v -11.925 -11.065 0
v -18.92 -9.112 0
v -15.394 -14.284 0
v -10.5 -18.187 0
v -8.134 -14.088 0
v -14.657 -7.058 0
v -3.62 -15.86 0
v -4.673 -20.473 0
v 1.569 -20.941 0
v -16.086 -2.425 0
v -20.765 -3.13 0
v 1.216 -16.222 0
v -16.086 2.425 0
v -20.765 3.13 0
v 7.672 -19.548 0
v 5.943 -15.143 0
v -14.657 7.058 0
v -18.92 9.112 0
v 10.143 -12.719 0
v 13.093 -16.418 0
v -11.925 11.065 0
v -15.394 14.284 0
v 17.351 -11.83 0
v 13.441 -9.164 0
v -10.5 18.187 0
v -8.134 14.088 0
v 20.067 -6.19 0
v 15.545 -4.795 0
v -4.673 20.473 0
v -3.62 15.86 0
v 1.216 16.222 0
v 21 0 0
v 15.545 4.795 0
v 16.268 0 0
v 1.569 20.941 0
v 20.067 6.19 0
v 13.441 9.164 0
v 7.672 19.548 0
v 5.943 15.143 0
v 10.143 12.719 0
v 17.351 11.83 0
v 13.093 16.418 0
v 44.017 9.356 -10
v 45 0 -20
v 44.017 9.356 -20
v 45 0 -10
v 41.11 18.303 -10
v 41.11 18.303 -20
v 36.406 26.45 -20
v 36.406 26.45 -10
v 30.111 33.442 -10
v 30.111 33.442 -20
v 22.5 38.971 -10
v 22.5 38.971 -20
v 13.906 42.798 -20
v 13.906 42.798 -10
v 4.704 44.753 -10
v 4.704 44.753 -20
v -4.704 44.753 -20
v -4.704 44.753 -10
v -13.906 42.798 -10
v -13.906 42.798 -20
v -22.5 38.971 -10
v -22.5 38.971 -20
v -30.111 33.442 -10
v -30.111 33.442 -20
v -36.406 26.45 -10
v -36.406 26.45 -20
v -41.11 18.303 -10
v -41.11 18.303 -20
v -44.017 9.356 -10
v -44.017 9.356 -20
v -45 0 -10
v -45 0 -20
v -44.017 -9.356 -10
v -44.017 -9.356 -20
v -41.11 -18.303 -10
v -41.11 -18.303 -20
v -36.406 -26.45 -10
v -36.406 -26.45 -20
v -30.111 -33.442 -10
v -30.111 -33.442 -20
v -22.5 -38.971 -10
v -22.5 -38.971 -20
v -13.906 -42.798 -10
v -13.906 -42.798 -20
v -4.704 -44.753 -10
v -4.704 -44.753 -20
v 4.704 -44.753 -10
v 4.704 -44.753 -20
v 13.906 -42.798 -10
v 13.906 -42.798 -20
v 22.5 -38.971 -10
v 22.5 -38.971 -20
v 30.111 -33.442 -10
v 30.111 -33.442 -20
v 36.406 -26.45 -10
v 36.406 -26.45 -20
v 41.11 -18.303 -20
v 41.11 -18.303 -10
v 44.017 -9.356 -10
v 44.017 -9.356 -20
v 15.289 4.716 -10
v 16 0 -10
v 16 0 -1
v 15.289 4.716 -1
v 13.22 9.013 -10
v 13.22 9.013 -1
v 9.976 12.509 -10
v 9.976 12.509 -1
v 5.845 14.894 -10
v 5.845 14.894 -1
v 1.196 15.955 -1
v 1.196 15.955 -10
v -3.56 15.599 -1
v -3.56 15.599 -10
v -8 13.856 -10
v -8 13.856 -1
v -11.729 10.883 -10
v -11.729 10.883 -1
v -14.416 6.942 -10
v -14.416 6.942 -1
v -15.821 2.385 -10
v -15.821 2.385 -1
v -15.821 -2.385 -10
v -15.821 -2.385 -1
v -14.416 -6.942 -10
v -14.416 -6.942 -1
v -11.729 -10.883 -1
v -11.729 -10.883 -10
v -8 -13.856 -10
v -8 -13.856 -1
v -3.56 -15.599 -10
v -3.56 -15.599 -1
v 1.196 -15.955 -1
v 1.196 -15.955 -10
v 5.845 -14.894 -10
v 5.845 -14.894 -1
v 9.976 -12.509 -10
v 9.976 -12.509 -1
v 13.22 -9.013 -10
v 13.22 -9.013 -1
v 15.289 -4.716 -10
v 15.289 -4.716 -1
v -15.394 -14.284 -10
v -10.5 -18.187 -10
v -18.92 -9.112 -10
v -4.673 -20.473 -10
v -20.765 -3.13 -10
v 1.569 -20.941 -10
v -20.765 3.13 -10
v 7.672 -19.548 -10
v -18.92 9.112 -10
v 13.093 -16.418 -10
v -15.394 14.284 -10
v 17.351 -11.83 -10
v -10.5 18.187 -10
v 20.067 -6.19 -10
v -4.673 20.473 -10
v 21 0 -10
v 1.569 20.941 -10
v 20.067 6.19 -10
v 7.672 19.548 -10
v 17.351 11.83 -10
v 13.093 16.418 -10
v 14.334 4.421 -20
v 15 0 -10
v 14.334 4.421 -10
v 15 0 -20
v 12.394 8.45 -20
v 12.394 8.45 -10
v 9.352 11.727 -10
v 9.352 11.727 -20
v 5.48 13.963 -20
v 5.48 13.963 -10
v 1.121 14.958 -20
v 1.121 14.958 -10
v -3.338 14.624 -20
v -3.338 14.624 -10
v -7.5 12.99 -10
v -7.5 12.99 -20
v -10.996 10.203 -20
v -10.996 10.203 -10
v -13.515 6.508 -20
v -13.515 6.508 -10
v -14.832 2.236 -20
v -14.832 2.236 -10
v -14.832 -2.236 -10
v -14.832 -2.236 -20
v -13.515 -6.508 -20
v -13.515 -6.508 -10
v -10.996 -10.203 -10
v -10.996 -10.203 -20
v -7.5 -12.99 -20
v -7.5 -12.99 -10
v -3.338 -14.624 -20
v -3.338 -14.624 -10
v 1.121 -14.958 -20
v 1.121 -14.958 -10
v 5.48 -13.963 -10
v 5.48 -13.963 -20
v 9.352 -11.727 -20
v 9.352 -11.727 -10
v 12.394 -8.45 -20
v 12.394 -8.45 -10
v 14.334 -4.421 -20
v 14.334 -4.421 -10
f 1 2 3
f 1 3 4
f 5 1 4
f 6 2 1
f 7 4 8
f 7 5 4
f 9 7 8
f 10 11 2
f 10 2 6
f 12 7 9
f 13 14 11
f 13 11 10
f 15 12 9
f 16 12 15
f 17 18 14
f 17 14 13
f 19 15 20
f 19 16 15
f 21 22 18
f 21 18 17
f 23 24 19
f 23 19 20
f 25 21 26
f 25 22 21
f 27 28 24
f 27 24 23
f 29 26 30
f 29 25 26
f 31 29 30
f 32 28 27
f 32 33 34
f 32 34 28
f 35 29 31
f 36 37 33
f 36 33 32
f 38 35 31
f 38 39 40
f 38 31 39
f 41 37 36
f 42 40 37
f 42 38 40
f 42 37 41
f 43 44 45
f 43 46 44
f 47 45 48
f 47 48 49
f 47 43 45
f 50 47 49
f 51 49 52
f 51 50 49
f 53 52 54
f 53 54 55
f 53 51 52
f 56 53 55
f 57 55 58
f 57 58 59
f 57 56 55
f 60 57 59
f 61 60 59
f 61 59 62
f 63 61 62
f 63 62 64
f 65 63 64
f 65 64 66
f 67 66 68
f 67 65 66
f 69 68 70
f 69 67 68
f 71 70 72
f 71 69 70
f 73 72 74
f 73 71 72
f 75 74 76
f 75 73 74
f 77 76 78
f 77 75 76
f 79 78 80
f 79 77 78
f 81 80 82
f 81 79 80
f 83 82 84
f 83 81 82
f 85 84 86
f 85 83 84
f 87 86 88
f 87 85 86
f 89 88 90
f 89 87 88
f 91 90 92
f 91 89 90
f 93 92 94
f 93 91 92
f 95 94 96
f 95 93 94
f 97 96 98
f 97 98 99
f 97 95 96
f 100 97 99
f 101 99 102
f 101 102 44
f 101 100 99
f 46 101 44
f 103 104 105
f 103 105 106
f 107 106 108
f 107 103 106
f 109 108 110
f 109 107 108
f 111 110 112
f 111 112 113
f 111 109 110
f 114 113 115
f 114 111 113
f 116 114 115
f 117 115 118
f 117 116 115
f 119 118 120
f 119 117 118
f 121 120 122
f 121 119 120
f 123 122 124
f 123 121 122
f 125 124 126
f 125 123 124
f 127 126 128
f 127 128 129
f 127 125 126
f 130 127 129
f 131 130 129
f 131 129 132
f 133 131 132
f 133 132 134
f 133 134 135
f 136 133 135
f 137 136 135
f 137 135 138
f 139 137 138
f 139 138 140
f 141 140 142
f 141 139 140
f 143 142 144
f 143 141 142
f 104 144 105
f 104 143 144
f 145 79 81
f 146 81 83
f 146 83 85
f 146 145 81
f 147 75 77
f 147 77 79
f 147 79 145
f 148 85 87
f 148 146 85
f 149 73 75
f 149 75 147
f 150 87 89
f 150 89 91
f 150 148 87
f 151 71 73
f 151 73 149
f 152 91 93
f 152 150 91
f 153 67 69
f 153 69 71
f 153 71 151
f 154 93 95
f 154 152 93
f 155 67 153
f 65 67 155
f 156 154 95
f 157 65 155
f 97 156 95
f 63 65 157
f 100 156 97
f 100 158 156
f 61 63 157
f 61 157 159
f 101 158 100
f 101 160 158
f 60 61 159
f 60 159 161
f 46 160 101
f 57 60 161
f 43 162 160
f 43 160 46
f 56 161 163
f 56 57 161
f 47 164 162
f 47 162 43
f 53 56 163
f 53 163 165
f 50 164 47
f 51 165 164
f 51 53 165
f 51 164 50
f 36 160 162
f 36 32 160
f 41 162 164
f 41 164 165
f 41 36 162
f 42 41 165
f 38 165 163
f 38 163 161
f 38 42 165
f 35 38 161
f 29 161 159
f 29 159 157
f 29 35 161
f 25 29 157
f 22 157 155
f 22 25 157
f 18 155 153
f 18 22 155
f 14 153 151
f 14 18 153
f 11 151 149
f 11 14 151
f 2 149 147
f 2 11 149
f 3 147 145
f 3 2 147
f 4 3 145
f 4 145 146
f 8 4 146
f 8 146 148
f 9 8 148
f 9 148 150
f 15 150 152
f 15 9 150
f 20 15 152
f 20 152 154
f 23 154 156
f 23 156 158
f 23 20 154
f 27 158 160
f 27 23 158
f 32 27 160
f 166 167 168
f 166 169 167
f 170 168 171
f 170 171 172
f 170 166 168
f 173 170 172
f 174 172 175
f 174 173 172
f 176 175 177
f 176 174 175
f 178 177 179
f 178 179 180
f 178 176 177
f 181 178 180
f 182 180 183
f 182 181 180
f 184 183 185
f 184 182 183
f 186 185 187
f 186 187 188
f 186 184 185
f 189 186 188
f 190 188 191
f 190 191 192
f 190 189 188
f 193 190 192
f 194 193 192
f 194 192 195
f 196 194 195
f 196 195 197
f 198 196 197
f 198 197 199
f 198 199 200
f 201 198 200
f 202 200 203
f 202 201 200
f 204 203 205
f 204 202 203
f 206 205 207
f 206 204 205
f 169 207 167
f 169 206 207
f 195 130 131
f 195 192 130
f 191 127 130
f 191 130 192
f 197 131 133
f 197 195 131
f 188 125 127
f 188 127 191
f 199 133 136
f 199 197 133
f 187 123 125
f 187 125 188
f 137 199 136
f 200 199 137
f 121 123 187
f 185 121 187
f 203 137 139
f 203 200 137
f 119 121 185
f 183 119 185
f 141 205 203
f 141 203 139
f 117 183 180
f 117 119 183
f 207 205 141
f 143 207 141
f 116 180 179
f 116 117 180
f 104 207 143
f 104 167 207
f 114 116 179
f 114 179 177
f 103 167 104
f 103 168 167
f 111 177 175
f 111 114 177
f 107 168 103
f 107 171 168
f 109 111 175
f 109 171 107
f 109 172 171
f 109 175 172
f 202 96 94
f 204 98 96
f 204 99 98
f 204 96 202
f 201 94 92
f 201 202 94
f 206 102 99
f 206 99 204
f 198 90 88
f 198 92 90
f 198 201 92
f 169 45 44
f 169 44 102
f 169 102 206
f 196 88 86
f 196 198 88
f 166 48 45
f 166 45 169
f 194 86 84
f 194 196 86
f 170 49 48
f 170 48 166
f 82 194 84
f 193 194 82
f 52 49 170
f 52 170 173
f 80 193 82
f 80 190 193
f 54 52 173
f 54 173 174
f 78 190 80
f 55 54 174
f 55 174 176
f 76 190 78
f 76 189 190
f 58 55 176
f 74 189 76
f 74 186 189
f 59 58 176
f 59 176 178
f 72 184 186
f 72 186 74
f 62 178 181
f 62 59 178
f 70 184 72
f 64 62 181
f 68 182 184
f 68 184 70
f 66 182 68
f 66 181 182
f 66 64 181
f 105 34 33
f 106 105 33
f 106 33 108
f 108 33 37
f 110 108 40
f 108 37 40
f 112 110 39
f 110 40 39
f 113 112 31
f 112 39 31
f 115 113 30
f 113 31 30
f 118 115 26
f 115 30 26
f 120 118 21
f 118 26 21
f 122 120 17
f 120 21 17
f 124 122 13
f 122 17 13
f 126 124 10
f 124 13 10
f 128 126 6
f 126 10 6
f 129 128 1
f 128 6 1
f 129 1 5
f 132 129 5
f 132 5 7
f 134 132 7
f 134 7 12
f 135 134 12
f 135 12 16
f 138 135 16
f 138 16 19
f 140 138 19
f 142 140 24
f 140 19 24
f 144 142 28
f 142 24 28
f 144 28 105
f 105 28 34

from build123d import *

# Parameters (mm, degrees)
CHAMFER1_SIZE  = 1
CHAMFER1_SIZE2 = 0.267949192


with BuildPart() as part:
    # Sketch1 → Revolve1 (revolve)
    with BuildSketch(Plane(origin=(0, 0, 0), x_dir=(1, 0, 0), z_dir=(0, 1, 0))):
        Polygon((16, 0), (16, 10), (15, 10), (15, 20), (45, 20), (45, 10), (21, 10), (21, 0), align=None)
    revolve(axis=Axis((0, 0, 0), (0, 0, 1)))

    # Chamfer1
    chamfer1_edges = [part.edges().sort_by_distance(p)[0] for p in [
        (-16, 0, 0),
    ]]
    chamfer1_side = [part.faces().sort_by_distance(p)[0] for p in [
        (-16, 0, -5),
    ]]
    chamfer(chamfer1_edges, length=CHAMFER1_SIZE, length2=CHAMFER1_SIZE2, reference=chamfer1_side[0])


solid = part.part
